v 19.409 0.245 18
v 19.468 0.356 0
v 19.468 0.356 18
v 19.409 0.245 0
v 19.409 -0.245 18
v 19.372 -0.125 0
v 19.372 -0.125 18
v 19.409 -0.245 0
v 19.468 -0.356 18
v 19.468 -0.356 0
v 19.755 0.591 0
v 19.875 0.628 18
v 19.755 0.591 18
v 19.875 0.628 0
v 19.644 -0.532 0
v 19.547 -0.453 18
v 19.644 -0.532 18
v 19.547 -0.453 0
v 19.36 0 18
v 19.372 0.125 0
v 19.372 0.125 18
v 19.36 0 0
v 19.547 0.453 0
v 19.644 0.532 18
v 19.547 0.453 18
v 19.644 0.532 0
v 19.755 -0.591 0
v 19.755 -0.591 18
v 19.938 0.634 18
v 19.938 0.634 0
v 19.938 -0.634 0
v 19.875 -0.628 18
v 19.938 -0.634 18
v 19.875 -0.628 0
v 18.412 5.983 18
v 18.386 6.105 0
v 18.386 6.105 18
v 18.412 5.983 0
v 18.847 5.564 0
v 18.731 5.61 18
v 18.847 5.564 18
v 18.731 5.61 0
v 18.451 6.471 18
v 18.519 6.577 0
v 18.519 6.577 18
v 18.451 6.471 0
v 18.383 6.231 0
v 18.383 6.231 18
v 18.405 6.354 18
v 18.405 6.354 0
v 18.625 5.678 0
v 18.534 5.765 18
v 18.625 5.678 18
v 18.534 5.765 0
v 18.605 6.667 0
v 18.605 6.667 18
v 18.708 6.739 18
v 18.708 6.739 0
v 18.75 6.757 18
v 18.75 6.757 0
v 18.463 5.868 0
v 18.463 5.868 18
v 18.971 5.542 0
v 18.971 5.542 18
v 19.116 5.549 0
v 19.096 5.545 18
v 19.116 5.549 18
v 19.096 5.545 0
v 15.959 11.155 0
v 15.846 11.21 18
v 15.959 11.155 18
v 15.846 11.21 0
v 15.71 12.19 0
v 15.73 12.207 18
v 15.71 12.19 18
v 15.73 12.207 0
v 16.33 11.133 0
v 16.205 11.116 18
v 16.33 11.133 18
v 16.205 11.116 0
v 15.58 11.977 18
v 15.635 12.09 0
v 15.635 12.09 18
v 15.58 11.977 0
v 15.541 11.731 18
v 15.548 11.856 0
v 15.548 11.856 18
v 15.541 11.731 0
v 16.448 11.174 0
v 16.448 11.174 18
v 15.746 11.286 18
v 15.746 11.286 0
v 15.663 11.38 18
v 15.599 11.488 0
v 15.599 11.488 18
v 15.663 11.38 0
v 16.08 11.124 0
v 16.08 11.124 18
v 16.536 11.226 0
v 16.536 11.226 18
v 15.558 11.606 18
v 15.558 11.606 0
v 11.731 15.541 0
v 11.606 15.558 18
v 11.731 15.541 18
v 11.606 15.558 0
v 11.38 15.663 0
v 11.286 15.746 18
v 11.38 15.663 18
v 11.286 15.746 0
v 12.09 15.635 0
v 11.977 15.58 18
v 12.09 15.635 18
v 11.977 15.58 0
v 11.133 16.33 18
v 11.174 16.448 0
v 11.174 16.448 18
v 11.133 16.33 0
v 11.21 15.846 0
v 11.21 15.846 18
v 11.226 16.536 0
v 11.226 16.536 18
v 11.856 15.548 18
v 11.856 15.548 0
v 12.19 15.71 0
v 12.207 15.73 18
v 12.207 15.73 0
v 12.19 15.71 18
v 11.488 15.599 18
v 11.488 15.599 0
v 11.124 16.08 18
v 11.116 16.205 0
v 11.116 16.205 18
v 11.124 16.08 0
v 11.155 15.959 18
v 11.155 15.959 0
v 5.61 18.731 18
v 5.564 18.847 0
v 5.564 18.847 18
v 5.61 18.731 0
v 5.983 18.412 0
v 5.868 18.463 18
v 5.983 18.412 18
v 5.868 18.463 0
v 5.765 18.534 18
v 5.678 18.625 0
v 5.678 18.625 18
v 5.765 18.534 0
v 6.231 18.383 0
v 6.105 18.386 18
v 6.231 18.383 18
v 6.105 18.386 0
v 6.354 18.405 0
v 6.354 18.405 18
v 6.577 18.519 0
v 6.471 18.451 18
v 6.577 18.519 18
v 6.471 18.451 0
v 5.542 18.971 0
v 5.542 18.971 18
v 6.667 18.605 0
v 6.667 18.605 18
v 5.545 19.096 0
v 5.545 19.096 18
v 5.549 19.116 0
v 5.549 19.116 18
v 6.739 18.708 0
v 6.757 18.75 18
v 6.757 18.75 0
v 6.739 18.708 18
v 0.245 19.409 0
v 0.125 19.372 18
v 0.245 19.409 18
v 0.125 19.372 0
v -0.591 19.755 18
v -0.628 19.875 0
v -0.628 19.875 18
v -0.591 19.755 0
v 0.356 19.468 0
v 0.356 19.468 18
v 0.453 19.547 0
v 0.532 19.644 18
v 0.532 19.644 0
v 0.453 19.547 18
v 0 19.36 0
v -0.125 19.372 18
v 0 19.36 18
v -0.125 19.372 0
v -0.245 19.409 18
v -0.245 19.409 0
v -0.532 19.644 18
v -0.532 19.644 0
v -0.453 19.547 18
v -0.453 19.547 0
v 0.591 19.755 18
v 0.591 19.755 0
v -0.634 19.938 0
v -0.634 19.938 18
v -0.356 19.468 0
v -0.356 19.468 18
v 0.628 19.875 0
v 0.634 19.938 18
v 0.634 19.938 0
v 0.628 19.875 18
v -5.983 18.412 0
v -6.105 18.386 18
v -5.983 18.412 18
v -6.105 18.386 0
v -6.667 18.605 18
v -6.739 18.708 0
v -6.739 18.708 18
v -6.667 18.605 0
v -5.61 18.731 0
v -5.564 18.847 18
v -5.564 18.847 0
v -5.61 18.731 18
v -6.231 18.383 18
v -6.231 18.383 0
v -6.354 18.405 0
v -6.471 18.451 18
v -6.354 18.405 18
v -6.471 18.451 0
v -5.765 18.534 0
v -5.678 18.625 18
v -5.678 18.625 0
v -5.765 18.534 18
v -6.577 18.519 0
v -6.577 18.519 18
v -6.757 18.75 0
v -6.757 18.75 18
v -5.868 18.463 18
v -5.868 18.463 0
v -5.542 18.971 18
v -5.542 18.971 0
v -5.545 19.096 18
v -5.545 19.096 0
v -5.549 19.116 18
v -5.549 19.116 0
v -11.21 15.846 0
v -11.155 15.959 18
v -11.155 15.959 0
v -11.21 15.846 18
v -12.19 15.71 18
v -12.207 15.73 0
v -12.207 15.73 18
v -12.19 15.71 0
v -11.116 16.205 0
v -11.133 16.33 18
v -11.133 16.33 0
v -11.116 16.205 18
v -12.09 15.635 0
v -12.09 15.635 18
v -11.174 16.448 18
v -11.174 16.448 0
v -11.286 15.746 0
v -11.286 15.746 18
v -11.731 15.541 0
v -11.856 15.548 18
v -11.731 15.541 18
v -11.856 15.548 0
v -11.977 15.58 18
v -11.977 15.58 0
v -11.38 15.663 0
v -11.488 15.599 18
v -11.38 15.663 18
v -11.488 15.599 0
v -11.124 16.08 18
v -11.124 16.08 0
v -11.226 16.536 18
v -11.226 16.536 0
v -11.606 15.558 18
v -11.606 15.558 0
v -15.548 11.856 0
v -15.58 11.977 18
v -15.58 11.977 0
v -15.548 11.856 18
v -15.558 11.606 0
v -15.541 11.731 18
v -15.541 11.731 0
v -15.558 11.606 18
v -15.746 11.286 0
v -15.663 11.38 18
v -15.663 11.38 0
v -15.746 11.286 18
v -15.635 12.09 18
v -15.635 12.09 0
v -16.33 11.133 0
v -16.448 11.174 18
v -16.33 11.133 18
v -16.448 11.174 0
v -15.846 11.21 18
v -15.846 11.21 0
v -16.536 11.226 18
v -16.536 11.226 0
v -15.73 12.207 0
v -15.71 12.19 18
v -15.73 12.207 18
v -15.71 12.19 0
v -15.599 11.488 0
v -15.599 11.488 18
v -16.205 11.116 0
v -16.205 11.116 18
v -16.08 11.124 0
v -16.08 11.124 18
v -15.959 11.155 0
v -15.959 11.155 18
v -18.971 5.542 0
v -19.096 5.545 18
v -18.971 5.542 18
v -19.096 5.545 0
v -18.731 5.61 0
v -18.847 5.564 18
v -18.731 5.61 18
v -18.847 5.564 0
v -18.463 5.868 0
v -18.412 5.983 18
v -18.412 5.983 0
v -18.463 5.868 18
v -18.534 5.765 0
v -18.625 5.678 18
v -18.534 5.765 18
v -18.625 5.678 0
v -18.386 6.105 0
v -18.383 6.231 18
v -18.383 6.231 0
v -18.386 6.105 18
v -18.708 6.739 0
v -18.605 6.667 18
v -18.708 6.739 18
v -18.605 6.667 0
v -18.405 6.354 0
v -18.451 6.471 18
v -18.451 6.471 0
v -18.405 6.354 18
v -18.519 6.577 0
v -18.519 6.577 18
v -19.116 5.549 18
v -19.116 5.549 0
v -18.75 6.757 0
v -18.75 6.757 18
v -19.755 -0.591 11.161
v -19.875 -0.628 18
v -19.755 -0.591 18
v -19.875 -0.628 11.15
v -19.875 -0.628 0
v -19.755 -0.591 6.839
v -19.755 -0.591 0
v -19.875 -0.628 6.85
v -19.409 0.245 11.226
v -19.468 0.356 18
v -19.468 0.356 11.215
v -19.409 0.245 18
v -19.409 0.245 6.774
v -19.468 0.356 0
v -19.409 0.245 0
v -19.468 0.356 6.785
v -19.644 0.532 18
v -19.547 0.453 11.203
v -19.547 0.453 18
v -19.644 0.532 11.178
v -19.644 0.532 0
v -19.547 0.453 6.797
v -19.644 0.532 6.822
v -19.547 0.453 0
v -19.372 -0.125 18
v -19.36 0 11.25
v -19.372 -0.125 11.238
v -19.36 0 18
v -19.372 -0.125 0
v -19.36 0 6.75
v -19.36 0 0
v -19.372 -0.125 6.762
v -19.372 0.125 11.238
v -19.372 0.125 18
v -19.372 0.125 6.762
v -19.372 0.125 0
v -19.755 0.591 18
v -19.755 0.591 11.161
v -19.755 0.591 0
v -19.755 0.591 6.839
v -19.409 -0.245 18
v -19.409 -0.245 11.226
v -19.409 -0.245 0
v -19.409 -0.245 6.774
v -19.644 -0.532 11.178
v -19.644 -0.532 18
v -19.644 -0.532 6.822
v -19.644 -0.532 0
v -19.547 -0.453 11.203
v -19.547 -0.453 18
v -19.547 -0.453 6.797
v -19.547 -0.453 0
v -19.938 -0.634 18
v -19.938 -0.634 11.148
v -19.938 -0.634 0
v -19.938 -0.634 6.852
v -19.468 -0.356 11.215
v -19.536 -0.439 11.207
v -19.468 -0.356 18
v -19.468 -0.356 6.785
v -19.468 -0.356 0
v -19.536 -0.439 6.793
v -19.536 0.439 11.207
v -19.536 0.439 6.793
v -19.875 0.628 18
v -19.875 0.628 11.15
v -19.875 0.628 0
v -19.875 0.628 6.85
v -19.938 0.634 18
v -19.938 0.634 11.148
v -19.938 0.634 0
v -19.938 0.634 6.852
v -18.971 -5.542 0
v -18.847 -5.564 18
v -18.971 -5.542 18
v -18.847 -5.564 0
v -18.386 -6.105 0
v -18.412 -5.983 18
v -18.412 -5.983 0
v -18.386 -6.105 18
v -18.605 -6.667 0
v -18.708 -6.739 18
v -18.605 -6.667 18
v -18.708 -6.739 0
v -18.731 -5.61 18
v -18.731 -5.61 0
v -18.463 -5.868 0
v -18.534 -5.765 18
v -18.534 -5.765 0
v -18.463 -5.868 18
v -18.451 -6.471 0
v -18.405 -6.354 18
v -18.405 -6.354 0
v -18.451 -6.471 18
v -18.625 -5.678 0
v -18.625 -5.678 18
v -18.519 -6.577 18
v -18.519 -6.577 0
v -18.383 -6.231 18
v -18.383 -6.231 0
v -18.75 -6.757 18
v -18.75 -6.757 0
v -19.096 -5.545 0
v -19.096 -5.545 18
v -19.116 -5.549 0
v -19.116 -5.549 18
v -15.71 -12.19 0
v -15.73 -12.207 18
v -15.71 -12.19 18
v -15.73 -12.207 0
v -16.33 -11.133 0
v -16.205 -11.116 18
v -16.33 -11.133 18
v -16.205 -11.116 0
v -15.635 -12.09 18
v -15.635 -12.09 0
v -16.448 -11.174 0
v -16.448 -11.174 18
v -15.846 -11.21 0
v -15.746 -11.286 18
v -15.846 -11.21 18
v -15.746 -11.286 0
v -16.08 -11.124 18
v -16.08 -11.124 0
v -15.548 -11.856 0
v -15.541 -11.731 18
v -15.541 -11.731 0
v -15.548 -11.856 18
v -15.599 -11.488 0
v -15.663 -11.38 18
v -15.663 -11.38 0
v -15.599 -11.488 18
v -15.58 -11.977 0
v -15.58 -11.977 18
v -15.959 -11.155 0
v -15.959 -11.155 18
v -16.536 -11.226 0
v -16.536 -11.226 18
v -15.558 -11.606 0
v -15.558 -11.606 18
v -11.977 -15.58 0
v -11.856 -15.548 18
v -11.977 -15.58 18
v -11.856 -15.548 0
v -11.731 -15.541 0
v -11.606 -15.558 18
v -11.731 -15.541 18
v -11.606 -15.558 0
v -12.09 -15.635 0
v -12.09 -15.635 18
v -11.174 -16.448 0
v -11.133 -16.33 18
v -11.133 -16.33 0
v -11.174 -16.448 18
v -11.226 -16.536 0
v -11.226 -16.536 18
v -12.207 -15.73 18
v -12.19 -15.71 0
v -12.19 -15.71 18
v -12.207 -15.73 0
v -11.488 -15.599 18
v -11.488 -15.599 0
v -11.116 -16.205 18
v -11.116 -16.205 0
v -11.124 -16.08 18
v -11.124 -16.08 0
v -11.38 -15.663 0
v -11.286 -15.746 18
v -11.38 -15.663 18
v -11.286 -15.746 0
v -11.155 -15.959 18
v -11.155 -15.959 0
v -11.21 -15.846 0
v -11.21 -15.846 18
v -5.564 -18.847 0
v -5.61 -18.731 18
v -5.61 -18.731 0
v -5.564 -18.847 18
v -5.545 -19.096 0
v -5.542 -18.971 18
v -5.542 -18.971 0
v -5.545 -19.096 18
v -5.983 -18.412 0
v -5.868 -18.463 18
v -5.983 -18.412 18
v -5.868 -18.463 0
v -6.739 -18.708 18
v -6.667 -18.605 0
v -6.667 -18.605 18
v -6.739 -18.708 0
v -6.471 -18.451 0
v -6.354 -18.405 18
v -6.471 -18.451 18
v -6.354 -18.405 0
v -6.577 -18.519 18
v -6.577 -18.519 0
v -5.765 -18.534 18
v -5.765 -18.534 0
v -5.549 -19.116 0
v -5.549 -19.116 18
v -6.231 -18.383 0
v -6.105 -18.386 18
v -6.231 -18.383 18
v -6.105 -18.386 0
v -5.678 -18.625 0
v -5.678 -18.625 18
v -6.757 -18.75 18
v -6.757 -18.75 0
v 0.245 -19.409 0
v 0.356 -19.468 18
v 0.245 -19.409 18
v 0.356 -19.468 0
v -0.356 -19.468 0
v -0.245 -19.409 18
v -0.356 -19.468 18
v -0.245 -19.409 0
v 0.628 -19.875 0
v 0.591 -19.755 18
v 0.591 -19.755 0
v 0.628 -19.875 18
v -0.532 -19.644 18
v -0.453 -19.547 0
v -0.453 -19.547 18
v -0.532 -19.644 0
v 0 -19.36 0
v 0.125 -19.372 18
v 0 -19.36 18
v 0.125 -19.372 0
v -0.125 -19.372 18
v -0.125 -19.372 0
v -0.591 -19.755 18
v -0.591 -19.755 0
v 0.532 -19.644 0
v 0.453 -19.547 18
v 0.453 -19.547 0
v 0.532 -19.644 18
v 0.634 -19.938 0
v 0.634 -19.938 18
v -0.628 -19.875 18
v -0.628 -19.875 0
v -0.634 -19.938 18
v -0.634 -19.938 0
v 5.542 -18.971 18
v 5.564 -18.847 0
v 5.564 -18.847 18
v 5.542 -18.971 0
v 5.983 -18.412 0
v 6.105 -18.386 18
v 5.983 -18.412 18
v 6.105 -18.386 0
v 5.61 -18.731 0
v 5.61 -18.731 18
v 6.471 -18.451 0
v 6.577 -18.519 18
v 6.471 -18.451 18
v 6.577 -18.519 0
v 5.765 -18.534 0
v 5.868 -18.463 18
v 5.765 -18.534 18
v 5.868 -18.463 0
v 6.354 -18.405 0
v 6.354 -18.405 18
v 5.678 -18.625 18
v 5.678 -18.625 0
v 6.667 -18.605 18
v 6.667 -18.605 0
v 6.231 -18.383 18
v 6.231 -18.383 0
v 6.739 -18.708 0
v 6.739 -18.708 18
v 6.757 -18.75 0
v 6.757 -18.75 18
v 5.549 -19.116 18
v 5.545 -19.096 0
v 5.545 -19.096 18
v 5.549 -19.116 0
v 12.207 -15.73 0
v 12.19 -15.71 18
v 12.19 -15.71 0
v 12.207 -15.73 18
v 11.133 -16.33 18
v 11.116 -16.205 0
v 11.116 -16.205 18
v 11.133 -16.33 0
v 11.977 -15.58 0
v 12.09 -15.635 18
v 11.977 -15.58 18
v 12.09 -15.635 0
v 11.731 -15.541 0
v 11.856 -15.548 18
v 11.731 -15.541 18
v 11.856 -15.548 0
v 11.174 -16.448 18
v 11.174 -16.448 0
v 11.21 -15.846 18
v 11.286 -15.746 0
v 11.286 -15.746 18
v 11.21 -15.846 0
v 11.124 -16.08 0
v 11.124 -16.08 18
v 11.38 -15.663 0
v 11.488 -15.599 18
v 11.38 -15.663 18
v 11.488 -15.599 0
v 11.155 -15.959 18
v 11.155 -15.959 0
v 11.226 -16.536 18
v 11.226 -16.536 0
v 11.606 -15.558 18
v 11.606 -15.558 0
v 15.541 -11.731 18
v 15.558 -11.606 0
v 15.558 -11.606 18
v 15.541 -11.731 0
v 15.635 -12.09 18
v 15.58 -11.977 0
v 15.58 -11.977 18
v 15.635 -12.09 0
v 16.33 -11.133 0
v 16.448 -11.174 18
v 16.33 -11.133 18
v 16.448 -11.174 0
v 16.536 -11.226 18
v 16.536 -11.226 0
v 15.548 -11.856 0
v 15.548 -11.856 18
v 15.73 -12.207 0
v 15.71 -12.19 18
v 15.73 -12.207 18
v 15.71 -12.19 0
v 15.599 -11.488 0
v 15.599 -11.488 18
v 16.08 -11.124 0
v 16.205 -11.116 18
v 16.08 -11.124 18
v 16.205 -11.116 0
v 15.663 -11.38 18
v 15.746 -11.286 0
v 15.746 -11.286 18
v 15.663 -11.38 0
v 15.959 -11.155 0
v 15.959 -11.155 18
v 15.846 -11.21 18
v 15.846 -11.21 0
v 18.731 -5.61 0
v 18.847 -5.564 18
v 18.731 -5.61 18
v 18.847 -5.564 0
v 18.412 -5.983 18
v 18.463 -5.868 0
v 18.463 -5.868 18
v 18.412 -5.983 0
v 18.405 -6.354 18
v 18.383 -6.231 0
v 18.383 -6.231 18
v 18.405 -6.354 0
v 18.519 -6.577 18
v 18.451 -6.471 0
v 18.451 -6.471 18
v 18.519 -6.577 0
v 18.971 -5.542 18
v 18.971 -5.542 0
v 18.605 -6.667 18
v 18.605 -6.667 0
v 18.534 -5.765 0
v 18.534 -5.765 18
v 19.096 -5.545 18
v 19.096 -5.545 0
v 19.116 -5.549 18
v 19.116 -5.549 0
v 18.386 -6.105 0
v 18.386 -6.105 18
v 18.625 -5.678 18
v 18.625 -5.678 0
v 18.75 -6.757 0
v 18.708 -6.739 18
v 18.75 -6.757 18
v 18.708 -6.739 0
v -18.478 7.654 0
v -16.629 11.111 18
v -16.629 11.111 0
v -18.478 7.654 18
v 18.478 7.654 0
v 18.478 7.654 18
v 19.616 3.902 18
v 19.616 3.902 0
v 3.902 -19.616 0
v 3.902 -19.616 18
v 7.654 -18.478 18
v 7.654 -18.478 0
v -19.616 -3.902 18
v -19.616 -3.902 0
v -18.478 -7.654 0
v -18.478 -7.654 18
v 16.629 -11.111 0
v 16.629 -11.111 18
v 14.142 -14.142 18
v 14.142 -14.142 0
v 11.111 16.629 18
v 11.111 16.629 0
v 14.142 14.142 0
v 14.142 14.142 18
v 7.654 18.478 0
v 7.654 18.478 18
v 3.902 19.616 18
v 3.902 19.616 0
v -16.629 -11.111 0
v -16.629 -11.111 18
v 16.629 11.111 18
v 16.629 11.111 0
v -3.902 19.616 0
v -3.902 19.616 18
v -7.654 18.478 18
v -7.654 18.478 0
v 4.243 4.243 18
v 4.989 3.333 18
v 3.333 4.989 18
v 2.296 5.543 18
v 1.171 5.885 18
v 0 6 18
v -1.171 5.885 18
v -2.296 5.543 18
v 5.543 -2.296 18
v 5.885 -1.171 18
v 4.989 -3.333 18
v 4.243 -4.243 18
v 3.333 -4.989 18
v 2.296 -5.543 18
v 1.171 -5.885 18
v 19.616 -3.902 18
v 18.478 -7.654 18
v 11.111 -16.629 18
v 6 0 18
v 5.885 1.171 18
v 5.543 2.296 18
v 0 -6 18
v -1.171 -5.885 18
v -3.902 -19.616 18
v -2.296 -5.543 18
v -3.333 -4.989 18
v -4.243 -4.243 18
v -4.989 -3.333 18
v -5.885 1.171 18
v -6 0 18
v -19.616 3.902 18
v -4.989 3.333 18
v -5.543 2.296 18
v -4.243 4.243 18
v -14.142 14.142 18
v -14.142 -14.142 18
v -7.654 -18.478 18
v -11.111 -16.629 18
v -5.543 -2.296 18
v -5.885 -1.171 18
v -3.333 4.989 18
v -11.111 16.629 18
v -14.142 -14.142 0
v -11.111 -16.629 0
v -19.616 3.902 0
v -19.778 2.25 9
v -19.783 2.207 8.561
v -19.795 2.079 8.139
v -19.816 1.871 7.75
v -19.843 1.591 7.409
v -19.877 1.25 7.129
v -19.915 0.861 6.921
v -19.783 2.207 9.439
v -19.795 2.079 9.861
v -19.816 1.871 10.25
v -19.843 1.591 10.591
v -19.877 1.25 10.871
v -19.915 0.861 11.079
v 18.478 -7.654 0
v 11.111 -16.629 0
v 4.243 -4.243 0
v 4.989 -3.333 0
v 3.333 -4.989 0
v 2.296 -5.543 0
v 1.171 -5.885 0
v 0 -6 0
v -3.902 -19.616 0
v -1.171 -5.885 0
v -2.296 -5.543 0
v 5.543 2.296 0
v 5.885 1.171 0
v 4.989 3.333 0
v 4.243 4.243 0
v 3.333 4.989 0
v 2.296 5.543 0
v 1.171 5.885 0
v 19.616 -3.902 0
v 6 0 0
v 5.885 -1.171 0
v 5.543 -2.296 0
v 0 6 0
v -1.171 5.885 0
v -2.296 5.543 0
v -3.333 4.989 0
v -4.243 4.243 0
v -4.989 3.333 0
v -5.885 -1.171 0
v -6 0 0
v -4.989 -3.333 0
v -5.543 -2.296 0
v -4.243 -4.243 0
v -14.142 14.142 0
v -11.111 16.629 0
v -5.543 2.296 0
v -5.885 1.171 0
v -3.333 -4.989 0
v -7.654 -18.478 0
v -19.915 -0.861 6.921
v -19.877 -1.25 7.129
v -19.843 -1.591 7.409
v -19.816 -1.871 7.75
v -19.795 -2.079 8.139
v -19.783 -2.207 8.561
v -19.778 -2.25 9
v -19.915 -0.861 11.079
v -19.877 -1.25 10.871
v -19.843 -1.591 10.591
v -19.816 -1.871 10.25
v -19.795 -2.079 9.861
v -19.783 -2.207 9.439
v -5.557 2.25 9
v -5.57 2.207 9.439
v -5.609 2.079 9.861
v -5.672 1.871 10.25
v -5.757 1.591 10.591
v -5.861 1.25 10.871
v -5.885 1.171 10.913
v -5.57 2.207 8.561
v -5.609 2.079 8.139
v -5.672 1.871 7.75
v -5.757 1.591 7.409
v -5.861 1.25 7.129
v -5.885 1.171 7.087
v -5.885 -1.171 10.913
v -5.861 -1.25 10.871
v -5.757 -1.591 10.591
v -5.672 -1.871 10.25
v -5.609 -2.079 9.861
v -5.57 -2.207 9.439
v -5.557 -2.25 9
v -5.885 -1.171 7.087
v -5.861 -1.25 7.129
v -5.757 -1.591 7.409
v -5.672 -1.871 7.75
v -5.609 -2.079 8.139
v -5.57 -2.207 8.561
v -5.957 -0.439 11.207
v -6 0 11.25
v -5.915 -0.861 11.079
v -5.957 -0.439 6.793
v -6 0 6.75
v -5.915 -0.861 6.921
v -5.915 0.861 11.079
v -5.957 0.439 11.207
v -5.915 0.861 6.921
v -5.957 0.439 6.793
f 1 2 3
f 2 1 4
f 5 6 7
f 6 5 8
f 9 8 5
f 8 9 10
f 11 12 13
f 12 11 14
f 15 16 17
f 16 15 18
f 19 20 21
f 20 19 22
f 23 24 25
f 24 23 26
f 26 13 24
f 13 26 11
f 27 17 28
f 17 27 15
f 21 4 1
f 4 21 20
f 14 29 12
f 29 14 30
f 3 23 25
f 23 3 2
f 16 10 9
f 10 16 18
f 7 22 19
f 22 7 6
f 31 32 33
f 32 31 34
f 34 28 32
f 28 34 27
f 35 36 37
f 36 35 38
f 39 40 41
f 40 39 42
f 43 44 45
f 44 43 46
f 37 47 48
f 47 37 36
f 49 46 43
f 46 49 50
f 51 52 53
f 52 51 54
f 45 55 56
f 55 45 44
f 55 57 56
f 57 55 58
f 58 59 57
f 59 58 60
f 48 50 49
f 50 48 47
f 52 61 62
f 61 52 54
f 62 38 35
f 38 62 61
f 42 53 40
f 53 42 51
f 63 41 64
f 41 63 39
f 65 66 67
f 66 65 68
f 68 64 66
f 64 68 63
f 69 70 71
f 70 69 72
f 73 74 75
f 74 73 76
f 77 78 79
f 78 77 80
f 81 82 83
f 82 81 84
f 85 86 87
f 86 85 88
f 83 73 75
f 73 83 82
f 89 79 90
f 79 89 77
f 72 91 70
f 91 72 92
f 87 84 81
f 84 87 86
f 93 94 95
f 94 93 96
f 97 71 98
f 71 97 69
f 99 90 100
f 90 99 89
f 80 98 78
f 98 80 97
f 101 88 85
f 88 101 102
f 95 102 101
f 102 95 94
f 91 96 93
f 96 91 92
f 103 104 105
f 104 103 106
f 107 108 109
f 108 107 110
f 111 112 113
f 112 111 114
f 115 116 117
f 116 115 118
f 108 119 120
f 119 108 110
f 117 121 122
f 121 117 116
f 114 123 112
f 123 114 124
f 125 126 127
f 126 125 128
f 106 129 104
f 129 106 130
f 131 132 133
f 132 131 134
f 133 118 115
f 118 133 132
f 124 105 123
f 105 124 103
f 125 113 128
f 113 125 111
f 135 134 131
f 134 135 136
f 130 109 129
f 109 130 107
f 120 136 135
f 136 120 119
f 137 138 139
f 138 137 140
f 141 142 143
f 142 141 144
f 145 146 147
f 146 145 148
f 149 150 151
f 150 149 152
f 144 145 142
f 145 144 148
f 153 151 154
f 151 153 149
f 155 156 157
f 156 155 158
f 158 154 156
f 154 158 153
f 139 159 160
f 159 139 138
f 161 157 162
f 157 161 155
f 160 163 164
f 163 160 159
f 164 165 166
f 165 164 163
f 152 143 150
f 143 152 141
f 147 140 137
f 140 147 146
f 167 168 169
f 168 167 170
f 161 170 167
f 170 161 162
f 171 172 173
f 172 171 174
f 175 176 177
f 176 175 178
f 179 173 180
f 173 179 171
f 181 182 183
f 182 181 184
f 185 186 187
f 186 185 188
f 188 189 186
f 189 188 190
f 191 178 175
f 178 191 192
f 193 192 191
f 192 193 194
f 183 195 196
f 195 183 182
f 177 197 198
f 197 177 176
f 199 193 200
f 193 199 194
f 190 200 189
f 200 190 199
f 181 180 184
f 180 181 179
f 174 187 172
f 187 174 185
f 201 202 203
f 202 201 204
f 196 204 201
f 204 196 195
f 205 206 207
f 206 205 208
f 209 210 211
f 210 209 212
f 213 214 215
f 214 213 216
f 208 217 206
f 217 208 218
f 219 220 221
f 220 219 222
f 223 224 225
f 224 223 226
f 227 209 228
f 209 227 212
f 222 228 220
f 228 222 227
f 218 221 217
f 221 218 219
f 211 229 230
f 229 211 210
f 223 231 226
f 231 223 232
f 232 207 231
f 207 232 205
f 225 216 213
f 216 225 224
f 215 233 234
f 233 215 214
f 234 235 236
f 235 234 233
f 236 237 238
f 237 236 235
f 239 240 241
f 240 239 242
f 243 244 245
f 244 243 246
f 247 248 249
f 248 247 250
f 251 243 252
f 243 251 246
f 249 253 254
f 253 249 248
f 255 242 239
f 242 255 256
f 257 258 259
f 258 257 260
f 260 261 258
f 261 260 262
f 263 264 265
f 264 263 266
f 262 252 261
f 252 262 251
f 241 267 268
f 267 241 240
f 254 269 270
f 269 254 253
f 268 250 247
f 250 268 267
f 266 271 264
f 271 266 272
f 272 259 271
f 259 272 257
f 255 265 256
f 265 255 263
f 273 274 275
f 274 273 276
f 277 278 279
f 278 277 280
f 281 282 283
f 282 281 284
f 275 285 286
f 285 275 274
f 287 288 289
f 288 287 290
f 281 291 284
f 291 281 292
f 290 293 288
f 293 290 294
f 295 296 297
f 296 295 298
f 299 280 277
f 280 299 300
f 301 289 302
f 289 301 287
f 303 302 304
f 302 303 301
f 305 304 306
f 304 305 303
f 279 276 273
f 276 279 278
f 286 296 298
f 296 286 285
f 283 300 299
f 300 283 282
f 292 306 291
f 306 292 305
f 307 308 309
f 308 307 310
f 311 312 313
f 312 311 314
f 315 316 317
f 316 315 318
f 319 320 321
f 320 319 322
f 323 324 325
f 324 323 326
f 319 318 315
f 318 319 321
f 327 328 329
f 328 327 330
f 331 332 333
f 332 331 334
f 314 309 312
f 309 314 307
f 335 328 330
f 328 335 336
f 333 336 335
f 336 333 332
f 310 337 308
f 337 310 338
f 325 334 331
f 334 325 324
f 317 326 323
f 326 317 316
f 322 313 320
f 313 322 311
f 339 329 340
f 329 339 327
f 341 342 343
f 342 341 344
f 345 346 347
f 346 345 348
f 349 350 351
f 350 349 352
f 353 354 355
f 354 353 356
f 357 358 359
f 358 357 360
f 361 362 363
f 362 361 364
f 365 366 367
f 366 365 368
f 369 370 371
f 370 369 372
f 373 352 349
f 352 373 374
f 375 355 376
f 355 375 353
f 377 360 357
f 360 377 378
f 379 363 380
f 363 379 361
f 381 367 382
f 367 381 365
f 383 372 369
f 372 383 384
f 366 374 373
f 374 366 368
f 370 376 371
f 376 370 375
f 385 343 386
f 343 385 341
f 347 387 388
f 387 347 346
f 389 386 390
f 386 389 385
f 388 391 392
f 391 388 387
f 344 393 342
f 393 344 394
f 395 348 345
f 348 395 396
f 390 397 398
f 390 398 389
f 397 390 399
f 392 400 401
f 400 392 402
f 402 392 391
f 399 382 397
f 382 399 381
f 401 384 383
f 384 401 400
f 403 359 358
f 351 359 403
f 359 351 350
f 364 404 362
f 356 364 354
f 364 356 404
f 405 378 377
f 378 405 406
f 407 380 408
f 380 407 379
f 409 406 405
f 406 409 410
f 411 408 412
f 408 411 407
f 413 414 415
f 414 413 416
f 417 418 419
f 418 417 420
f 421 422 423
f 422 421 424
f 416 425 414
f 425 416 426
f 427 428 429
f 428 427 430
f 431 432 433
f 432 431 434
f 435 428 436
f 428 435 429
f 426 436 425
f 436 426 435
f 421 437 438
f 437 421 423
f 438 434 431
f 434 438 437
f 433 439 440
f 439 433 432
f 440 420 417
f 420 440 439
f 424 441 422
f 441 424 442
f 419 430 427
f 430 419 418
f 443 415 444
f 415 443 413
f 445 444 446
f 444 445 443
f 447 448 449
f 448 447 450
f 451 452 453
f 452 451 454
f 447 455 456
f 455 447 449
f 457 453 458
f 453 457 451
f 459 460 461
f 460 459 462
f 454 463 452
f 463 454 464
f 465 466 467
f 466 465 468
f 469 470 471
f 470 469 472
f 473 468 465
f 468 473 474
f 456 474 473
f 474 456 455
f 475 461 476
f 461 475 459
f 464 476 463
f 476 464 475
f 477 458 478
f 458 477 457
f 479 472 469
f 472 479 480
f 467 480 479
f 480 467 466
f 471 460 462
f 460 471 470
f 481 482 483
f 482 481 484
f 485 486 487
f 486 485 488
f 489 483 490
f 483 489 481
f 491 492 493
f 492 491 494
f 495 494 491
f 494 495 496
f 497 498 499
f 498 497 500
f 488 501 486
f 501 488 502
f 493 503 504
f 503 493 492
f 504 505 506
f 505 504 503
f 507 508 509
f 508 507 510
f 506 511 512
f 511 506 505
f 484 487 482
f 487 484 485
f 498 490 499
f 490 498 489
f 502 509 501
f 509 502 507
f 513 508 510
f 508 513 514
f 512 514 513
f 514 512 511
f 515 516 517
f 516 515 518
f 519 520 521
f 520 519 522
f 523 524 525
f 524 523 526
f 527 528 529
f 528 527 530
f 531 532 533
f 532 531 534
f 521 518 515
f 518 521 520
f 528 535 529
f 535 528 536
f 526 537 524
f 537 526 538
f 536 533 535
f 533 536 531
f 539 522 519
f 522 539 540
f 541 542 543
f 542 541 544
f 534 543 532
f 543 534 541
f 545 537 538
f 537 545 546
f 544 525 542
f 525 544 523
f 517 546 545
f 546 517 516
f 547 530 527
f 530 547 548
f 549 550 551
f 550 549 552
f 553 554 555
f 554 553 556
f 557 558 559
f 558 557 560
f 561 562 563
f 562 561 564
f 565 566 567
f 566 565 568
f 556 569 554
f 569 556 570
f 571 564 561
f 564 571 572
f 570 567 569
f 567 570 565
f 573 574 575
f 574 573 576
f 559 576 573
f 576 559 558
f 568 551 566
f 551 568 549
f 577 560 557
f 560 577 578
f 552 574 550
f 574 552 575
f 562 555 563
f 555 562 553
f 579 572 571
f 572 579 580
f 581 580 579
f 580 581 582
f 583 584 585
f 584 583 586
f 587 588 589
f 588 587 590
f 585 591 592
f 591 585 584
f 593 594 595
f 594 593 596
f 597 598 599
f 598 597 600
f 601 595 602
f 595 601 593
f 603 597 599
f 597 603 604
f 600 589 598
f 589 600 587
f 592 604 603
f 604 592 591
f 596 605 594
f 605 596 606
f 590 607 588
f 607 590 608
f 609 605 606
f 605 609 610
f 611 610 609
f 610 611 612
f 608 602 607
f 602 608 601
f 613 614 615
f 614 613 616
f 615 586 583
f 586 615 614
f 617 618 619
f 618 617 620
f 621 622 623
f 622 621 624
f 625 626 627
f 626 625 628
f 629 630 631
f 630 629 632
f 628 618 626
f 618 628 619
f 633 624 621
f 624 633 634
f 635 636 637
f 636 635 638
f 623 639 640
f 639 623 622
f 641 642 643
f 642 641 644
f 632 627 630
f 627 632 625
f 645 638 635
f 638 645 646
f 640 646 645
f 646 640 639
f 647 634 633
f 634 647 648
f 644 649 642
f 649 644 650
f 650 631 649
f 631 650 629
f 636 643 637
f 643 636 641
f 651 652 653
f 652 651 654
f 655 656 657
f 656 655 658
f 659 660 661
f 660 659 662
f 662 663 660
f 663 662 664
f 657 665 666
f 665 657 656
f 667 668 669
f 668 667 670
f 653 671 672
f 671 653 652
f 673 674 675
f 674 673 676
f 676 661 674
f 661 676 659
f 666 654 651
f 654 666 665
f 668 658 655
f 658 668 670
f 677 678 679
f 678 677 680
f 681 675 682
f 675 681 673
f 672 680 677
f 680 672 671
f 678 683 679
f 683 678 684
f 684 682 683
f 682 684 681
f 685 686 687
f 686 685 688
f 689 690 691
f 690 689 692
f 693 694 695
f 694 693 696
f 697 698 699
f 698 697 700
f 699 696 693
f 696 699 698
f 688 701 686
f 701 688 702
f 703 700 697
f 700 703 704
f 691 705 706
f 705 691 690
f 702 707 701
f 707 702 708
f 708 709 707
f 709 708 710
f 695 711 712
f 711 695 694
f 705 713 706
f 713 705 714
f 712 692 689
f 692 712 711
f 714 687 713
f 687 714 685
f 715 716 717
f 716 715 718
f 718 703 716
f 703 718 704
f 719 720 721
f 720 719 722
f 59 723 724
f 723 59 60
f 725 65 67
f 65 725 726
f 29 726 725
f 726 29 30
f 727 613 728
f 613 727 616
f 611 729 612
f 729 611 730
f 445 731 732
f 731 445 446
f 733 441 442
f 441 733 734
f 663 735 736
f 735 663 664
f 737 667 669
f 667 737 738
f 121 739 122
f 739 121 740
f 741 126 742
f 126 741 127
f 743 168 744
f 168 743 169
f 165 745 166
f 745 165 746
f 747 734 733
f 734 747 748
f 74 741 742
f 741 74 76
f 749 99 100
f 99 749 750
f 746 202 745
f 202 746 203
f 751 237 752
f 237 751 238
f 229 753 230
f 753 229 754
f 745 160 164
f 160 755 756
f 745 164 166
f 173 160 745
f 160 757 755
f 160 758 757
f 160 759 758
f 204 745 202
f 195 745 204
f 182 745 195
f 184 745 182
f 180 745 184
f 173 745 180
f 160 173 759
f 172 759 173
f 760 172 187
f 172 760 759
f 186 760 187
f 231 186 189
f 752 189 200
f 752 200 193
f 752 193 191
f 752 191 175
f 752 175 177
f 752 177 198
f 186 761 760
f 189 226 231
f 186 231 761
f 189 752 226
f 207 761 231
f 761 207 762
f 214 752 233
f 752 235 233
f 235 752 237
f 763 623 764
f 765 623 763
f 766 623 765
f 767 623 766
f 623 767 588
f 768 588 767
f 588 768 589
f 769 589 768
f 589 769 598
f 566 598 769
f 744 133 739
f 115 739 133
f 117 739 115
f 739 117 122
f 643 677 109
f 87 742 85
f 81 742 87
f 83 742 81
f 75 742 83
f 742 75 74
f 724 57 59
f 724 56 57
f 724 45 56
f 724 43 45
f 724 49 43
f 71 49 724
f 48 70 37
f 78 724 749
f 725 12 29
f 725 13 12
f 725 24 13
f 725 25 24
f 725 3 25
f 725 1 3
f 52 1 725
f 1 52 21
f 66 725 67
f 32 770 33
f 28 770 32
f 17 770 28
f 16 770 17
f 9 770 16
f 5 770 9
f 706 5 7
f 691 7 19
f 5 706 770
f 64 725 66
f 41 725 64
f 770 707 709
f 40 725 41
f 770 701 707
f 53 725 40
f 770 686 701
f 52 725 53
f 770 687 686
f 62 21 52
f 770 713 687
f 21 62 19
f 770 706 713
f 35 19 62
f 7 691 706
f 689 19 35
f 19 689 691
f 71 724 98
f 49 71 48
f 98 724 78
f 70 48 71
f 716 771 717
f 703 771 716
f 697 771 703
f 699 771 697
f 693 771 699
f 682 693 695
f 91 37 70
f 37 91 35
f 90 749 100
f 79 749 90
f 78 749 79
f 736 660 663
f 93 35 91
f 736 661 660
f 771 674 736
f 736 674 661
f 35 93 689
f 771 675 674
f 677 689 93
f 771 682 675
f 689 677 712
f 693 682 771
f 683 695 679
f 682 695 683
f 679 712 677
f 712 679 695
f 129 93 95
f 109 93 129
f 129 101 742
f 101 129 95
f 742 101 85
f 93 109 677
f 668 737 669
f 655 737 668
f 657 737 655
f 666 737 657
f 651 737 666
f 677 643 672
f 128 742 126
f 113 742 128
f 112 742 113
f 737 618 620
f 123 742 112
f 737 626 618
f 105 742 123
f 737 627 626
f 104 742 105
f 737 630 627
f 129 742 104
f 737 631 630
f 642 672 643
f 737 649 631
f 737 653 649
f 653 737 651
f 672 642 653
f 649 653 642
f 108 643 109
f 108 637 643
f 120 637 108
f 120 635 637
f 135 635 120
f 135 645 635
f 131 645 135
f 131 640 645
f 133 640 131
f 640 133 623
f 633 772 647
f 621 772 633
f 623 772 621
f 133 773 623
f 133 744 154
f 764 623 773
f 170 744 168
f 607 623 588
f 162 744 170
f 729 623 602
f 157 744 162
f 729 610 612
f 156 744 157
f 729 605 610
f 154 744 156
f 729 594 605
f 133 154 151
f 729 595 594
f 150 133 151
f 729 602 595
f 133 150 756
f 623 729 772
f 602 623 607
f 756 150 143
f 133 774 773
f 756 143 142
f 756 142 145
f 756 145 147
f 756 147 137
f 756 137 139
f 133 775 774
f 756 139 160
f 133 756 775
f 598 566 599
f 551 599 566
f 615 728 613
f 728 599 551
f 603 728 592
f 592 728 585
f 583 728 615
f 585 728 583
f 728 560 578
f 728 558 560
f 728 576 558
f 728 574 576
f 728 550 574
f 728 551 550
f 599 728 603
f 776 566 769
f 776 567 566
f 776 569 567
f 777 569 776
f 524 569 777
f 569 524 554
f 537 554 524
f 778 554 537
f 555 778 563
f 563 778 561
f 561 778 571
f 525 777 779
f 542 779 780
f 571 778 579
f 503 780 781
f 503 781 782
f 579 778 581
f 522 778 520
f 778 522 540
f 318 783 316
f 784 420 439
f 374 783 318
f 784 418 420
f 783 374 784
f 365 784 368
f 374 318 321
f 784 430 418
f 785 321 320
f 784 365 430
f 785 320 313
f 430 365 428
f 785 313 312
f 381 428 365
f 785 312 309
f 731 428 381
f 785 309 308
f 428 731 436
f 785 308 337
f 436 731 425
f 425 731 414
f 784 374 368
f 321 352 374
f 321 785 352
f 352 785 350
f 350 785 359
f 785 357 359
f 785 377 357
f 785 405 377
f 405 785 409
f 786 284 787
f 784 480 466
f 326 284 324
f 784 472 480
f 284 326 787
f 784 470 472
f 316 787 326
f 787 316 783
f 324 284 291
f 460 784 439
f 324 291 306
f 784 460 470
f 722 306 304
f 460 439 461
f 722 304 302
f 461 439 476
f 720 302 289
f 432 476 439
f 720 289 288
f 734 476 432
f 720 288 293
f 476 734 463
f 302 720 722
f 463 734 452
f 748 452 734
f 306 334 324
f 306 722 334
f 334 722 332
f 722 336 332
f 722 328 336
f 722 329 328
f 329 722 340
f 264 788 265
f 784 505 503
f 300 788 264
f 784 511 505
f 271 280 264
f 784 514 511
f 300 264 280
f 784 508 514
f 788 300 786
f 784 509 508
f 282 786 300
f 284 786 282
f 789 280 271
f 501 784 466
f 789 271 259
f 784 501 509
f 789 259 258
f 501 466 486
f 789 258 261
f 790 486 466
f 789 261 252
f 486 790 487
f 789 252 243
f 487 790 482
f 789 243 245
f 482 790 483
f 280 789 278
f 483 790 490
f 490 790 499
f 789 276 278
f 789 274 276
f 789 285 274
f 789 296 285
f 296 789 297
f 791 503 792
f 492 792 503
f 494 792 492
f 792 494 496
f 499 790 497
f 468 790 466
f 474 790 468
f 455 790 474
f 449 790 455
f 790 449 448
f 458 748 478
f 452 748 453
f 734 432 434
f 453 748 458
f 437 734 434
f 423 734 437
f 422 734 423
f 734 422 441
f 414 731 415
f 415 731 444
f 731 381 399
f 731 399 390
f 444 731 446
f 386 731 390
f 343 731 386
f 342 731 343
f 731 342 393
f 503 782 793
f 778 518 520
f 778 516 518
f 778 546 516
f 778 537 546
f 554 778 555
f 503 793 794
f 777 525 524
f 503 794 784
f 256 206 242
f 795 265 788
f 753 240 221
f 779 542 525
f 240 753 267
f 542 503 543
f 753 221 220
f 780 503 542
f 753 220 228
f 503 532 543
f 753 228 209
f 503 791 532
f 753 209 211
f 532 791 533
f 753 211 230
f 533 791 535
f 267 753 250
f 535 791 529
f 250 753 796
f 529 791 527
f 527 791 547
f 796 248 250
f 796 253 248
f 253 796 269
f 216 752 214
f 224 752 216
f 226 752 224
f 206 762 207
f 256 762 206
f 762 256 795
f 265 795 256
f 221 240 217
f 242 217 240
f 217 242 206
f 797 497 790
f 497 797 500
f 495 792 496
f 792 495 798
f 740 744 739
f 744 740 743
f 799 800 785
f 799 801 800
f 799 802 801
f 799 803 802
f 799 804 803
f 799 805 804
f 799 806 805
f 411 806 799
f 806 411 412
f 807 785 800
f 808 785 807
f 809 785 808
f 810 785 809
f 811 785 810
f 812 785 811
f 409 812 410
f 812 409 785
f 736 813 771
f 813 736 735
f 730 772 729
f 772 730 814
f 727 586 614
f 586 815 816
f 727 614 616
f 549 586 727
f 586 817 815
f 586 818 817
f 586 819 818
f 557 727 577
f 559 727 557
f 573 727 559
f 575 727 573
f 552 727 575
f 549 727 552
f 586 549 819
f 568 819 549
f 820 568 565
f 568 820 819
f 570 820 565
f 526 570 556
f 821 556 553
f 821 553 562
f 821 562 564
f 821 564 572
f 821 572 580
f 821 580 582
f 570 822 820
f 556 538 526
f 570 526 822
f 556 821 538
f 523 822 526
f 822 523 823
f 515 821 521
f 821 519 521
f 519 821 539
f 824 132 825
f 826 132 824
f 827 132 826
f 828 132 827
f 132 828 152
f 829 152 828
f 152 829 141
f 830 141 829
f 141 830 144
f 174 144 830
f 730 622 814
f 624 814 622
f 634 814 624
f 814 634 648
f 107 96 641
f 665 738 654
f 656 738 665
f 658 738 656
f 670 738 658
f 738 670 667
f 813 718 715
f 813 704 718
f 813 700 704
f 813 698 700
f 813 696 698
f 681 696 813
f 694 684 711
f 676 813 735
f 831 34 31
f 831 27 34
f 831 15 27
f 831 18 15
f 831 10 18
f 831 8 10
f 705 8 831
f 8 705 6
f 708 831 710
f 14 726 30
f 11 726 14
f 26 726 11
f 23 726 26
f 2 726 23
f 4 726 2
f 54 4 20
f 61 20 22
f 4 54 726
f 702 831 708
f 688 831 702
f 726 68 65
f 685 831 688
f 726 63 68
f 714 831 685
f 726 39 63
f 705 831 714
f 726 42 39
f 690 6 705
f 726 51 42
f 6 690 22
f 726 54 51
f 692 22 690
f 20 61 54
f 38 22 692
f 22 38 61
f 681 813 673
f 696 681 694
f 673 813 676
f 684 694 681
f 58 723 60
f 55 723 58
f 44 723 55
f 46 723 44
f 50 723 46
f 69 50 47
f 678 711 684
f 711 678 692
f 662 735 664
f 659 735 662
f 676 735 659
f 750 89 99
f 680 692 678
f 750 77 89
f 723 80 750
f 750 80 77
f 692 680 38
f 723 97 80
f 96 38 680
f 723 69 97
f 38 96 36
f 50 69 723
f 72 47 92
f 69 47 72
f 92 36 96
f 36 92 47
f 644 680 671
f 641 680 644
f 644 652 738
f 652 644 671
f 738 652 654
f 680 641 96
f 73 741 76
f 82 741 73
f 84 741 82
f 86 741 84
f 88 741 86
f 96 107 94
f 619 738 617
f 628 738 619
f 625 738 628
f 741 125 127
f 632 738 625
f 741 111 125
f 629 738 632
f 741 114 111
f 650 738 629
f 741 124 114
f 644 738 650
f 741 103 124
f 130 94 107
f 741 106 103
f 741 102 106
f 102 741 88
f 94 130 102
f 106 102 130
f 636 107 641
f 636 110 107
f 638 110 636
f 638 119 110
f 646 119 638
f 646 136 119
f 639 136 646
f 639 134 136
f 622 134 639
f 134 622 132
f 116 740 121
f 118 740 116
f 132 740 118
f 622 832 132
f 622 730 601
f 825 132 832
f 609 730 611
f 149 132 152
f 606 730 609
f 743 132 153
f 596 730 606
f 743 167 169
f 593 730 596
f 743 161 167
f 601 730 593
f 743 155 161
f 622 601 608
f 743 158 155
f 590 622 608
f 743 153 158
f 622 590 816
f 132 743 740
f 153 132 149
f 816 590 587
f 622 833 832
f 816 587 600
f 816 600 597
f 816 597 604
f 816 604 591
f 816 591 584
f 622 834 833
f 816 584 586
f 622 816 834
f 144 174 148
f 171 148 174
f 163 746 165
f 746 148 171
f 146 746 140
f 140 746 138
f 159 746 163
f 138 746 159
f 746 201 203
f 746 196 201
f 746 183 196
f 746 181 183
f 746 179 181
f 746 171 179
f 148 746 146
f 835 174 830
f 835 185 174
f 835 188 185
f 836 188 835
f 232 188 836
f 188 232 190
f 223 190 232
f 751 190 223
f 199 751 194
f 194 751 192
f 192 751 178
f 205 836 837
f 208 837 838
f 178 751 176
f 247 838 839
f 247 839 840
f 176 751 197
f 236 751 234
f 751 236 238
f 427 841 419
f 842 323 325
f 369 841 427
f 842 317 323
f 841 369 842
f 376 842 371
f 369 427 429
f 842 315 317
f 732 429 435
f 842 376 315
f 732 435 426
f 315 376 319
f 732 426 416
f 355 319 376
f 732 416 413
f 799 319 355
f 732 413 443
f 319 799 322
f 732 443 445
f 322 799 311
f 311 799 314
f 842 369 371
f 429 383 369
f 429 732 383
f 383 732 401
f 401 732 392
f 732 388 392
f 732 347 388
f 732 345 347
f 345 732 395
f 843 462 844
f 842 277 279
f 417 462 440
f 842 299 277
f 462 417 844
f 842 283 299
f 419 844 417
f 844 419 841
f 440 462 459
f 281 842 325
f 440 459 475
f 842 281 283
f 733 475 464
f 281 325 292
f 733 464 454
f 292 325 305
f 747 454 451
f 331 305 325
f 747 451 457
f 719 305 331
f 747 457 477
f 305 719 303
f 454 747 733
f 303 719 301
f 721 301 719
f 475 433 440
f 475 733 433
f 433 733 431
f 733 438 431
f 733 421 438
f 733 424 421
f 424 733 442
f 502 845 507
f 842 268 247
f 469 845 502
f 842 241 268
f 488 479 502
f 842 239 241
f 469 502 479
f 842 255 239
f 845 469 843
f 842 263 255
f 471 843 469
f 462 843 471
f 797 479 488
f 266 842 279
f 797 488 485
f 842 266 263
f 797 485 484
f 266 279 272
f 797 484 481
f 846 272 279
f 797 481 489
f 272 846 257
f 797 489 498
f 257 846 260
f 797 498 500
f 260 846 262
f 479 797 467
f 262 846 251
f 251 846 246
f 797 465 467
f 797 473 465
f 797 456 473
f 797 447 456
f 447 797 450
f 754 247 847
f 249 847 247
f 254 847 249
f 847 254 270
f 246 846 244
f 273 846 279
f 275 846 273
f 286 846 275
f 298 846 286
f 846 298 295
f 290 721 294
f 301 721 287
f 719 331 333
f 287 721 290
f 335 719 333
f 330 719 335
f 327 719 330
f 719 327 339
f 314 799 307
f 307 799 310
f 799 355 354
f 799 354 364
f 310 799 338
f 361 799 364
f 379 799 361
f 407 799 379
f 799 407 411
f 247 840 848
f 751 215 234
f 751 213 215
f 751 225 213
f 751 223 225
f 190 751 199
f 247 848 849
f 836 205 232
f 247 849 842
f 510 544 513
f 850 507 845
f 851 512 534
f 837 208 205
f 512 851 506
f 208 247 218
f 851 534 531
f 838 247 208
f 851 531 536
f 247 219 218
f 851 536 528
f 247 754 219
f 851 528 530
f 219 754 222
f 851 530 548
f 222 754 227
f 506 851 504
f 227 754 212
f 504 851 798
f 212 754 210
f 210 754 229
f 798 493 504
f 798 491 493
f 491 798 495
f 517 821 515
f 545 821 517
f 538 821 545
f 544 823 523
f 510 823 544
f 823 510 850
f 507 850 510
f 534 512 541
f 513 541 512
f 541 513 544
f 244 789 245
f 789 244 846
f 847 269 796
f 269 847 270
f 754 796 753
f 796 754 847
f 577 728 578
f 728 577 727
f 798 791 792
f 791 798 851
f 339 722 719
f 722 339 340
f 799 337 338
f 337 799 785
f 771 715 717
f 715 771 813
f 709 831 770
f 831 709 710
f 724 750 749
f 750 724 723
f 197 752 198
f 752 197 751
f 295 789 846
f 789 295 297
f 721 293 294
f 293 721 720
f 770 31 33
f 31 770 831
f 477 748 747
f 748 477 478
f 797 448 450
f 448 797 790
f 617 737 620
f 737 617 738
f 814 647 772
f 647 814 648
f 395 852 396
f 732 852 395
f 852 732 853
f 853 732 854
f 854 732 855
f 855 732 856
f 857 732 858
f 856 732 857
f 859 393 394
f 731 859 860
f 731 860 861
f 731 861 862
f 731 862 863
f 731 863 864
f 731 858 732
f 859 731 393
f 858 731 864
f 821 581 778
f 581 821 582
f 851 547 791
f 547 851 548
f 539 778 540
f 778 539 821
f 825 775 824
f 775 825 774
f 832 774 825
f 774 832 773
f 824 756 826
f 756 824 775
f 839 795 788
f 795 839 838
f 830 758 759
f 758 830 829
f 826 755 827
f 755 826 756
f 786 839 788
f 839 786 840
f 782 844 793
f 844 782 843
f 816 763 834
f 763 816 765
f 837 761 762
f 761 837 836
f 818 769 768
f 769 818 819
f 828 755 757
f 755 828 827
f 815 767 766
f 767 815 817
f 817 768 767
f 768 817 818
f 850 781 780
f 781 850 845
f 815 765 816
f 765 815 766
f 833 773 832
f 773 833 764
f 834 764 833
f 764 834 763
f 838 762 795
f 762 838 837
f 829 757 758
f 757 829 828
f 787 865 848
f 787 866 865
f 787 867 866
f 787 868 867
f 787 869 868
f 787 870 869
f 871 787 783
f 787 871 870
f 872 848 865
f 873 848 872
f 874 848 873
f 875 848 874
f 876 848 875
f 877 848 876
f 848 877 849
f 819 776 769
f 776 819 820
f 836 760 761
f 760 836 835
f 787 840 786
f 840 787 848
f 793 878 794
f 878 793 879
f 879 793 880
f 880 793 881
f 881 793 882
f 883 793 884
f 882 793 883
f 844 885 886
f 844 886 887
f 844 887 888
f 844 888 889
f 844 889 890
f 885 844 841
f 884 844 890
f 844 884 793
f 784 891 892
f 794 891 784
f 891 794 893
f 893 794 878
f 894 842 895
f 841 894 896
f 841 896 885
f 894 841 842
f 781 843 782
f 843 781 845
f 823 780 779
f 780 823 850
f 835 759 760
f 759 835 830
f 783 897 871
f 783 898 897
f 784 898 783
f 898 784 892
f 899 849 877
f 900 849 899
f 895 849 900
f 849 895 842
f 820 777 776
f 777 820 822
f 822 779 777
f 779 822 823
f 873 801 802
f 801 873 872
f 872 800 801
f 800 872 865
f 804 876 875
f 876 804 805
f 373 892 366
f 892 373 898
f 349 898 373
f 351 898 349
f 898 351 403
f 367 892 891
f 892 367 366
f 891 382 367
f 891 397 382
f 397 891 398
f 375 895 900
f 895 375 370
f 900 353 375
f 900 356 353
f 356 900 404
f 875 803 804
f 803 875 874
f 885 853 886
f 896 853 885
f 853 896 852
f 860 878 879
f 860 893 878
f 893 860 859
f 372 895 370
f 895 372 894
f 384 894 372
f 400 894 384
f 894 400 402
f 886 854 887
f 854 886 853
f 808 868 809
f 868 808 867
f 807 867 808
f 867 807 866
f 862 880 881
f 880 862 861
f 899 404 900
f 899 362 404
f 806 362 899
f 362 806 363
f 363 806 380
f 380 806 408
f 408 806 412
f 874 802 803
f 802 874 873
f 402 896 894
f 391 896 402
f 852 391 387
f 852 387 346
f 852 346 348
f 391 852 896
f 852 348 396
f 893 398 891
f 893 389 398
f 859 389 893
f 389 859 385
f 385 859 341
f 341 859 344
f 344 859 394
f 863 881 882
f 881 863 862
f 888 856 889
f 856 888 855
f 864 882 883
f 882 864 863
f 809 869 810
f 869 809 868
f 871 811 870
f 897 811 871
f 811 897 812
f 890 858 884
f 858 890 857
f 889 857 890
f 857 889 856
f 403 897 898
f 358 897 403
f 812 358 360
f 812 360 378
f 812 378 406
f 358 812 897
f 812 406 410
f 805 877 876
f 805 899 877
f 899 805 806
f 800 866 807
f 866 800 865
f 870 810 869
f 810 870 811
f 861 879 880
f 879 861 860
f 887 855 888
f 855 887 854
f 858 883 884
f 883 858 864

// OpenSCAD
$fn = 32;

// ----------------------------------------------------------------------
// Hand knob: 40 x 40 x 18 mm
// ----------------------------------------------------------------------

// --- parameters (mm) ---
knob_d = 40;              // knob diameter
knob_h = 18;              // knob height
bore_d = 12;              // shaft bore
set_d = 4.5;              // set screw tap hole
knurl_d = 1.28;           // knurl groove diameter
knurl_n = 20;             // number of knurl grooves

module body() {
  cylinder(h = knob_h, d = knob_d);
}

difference() {
  union() {
    body();
  }
  translate([0, 0, -1]) cylinder(h = knob_h + 0 + 2, d = bore_d);
  /* knurl grooves */
  for (i = [0 : knurl_n - 1])
    rotate([0, 0, i * 360 / knurl_n])
      translate([knob_d / 2, 0, -0.5])
        cylinder(h = knob_h + 1, d = knurl_d);
  translate([-knob_d / 2 - 1, 0, knob_h * 0.5]) rotate([0, 90, 0]) cylinder(h = knob_d / 2 + 2, d = set_d);
}
